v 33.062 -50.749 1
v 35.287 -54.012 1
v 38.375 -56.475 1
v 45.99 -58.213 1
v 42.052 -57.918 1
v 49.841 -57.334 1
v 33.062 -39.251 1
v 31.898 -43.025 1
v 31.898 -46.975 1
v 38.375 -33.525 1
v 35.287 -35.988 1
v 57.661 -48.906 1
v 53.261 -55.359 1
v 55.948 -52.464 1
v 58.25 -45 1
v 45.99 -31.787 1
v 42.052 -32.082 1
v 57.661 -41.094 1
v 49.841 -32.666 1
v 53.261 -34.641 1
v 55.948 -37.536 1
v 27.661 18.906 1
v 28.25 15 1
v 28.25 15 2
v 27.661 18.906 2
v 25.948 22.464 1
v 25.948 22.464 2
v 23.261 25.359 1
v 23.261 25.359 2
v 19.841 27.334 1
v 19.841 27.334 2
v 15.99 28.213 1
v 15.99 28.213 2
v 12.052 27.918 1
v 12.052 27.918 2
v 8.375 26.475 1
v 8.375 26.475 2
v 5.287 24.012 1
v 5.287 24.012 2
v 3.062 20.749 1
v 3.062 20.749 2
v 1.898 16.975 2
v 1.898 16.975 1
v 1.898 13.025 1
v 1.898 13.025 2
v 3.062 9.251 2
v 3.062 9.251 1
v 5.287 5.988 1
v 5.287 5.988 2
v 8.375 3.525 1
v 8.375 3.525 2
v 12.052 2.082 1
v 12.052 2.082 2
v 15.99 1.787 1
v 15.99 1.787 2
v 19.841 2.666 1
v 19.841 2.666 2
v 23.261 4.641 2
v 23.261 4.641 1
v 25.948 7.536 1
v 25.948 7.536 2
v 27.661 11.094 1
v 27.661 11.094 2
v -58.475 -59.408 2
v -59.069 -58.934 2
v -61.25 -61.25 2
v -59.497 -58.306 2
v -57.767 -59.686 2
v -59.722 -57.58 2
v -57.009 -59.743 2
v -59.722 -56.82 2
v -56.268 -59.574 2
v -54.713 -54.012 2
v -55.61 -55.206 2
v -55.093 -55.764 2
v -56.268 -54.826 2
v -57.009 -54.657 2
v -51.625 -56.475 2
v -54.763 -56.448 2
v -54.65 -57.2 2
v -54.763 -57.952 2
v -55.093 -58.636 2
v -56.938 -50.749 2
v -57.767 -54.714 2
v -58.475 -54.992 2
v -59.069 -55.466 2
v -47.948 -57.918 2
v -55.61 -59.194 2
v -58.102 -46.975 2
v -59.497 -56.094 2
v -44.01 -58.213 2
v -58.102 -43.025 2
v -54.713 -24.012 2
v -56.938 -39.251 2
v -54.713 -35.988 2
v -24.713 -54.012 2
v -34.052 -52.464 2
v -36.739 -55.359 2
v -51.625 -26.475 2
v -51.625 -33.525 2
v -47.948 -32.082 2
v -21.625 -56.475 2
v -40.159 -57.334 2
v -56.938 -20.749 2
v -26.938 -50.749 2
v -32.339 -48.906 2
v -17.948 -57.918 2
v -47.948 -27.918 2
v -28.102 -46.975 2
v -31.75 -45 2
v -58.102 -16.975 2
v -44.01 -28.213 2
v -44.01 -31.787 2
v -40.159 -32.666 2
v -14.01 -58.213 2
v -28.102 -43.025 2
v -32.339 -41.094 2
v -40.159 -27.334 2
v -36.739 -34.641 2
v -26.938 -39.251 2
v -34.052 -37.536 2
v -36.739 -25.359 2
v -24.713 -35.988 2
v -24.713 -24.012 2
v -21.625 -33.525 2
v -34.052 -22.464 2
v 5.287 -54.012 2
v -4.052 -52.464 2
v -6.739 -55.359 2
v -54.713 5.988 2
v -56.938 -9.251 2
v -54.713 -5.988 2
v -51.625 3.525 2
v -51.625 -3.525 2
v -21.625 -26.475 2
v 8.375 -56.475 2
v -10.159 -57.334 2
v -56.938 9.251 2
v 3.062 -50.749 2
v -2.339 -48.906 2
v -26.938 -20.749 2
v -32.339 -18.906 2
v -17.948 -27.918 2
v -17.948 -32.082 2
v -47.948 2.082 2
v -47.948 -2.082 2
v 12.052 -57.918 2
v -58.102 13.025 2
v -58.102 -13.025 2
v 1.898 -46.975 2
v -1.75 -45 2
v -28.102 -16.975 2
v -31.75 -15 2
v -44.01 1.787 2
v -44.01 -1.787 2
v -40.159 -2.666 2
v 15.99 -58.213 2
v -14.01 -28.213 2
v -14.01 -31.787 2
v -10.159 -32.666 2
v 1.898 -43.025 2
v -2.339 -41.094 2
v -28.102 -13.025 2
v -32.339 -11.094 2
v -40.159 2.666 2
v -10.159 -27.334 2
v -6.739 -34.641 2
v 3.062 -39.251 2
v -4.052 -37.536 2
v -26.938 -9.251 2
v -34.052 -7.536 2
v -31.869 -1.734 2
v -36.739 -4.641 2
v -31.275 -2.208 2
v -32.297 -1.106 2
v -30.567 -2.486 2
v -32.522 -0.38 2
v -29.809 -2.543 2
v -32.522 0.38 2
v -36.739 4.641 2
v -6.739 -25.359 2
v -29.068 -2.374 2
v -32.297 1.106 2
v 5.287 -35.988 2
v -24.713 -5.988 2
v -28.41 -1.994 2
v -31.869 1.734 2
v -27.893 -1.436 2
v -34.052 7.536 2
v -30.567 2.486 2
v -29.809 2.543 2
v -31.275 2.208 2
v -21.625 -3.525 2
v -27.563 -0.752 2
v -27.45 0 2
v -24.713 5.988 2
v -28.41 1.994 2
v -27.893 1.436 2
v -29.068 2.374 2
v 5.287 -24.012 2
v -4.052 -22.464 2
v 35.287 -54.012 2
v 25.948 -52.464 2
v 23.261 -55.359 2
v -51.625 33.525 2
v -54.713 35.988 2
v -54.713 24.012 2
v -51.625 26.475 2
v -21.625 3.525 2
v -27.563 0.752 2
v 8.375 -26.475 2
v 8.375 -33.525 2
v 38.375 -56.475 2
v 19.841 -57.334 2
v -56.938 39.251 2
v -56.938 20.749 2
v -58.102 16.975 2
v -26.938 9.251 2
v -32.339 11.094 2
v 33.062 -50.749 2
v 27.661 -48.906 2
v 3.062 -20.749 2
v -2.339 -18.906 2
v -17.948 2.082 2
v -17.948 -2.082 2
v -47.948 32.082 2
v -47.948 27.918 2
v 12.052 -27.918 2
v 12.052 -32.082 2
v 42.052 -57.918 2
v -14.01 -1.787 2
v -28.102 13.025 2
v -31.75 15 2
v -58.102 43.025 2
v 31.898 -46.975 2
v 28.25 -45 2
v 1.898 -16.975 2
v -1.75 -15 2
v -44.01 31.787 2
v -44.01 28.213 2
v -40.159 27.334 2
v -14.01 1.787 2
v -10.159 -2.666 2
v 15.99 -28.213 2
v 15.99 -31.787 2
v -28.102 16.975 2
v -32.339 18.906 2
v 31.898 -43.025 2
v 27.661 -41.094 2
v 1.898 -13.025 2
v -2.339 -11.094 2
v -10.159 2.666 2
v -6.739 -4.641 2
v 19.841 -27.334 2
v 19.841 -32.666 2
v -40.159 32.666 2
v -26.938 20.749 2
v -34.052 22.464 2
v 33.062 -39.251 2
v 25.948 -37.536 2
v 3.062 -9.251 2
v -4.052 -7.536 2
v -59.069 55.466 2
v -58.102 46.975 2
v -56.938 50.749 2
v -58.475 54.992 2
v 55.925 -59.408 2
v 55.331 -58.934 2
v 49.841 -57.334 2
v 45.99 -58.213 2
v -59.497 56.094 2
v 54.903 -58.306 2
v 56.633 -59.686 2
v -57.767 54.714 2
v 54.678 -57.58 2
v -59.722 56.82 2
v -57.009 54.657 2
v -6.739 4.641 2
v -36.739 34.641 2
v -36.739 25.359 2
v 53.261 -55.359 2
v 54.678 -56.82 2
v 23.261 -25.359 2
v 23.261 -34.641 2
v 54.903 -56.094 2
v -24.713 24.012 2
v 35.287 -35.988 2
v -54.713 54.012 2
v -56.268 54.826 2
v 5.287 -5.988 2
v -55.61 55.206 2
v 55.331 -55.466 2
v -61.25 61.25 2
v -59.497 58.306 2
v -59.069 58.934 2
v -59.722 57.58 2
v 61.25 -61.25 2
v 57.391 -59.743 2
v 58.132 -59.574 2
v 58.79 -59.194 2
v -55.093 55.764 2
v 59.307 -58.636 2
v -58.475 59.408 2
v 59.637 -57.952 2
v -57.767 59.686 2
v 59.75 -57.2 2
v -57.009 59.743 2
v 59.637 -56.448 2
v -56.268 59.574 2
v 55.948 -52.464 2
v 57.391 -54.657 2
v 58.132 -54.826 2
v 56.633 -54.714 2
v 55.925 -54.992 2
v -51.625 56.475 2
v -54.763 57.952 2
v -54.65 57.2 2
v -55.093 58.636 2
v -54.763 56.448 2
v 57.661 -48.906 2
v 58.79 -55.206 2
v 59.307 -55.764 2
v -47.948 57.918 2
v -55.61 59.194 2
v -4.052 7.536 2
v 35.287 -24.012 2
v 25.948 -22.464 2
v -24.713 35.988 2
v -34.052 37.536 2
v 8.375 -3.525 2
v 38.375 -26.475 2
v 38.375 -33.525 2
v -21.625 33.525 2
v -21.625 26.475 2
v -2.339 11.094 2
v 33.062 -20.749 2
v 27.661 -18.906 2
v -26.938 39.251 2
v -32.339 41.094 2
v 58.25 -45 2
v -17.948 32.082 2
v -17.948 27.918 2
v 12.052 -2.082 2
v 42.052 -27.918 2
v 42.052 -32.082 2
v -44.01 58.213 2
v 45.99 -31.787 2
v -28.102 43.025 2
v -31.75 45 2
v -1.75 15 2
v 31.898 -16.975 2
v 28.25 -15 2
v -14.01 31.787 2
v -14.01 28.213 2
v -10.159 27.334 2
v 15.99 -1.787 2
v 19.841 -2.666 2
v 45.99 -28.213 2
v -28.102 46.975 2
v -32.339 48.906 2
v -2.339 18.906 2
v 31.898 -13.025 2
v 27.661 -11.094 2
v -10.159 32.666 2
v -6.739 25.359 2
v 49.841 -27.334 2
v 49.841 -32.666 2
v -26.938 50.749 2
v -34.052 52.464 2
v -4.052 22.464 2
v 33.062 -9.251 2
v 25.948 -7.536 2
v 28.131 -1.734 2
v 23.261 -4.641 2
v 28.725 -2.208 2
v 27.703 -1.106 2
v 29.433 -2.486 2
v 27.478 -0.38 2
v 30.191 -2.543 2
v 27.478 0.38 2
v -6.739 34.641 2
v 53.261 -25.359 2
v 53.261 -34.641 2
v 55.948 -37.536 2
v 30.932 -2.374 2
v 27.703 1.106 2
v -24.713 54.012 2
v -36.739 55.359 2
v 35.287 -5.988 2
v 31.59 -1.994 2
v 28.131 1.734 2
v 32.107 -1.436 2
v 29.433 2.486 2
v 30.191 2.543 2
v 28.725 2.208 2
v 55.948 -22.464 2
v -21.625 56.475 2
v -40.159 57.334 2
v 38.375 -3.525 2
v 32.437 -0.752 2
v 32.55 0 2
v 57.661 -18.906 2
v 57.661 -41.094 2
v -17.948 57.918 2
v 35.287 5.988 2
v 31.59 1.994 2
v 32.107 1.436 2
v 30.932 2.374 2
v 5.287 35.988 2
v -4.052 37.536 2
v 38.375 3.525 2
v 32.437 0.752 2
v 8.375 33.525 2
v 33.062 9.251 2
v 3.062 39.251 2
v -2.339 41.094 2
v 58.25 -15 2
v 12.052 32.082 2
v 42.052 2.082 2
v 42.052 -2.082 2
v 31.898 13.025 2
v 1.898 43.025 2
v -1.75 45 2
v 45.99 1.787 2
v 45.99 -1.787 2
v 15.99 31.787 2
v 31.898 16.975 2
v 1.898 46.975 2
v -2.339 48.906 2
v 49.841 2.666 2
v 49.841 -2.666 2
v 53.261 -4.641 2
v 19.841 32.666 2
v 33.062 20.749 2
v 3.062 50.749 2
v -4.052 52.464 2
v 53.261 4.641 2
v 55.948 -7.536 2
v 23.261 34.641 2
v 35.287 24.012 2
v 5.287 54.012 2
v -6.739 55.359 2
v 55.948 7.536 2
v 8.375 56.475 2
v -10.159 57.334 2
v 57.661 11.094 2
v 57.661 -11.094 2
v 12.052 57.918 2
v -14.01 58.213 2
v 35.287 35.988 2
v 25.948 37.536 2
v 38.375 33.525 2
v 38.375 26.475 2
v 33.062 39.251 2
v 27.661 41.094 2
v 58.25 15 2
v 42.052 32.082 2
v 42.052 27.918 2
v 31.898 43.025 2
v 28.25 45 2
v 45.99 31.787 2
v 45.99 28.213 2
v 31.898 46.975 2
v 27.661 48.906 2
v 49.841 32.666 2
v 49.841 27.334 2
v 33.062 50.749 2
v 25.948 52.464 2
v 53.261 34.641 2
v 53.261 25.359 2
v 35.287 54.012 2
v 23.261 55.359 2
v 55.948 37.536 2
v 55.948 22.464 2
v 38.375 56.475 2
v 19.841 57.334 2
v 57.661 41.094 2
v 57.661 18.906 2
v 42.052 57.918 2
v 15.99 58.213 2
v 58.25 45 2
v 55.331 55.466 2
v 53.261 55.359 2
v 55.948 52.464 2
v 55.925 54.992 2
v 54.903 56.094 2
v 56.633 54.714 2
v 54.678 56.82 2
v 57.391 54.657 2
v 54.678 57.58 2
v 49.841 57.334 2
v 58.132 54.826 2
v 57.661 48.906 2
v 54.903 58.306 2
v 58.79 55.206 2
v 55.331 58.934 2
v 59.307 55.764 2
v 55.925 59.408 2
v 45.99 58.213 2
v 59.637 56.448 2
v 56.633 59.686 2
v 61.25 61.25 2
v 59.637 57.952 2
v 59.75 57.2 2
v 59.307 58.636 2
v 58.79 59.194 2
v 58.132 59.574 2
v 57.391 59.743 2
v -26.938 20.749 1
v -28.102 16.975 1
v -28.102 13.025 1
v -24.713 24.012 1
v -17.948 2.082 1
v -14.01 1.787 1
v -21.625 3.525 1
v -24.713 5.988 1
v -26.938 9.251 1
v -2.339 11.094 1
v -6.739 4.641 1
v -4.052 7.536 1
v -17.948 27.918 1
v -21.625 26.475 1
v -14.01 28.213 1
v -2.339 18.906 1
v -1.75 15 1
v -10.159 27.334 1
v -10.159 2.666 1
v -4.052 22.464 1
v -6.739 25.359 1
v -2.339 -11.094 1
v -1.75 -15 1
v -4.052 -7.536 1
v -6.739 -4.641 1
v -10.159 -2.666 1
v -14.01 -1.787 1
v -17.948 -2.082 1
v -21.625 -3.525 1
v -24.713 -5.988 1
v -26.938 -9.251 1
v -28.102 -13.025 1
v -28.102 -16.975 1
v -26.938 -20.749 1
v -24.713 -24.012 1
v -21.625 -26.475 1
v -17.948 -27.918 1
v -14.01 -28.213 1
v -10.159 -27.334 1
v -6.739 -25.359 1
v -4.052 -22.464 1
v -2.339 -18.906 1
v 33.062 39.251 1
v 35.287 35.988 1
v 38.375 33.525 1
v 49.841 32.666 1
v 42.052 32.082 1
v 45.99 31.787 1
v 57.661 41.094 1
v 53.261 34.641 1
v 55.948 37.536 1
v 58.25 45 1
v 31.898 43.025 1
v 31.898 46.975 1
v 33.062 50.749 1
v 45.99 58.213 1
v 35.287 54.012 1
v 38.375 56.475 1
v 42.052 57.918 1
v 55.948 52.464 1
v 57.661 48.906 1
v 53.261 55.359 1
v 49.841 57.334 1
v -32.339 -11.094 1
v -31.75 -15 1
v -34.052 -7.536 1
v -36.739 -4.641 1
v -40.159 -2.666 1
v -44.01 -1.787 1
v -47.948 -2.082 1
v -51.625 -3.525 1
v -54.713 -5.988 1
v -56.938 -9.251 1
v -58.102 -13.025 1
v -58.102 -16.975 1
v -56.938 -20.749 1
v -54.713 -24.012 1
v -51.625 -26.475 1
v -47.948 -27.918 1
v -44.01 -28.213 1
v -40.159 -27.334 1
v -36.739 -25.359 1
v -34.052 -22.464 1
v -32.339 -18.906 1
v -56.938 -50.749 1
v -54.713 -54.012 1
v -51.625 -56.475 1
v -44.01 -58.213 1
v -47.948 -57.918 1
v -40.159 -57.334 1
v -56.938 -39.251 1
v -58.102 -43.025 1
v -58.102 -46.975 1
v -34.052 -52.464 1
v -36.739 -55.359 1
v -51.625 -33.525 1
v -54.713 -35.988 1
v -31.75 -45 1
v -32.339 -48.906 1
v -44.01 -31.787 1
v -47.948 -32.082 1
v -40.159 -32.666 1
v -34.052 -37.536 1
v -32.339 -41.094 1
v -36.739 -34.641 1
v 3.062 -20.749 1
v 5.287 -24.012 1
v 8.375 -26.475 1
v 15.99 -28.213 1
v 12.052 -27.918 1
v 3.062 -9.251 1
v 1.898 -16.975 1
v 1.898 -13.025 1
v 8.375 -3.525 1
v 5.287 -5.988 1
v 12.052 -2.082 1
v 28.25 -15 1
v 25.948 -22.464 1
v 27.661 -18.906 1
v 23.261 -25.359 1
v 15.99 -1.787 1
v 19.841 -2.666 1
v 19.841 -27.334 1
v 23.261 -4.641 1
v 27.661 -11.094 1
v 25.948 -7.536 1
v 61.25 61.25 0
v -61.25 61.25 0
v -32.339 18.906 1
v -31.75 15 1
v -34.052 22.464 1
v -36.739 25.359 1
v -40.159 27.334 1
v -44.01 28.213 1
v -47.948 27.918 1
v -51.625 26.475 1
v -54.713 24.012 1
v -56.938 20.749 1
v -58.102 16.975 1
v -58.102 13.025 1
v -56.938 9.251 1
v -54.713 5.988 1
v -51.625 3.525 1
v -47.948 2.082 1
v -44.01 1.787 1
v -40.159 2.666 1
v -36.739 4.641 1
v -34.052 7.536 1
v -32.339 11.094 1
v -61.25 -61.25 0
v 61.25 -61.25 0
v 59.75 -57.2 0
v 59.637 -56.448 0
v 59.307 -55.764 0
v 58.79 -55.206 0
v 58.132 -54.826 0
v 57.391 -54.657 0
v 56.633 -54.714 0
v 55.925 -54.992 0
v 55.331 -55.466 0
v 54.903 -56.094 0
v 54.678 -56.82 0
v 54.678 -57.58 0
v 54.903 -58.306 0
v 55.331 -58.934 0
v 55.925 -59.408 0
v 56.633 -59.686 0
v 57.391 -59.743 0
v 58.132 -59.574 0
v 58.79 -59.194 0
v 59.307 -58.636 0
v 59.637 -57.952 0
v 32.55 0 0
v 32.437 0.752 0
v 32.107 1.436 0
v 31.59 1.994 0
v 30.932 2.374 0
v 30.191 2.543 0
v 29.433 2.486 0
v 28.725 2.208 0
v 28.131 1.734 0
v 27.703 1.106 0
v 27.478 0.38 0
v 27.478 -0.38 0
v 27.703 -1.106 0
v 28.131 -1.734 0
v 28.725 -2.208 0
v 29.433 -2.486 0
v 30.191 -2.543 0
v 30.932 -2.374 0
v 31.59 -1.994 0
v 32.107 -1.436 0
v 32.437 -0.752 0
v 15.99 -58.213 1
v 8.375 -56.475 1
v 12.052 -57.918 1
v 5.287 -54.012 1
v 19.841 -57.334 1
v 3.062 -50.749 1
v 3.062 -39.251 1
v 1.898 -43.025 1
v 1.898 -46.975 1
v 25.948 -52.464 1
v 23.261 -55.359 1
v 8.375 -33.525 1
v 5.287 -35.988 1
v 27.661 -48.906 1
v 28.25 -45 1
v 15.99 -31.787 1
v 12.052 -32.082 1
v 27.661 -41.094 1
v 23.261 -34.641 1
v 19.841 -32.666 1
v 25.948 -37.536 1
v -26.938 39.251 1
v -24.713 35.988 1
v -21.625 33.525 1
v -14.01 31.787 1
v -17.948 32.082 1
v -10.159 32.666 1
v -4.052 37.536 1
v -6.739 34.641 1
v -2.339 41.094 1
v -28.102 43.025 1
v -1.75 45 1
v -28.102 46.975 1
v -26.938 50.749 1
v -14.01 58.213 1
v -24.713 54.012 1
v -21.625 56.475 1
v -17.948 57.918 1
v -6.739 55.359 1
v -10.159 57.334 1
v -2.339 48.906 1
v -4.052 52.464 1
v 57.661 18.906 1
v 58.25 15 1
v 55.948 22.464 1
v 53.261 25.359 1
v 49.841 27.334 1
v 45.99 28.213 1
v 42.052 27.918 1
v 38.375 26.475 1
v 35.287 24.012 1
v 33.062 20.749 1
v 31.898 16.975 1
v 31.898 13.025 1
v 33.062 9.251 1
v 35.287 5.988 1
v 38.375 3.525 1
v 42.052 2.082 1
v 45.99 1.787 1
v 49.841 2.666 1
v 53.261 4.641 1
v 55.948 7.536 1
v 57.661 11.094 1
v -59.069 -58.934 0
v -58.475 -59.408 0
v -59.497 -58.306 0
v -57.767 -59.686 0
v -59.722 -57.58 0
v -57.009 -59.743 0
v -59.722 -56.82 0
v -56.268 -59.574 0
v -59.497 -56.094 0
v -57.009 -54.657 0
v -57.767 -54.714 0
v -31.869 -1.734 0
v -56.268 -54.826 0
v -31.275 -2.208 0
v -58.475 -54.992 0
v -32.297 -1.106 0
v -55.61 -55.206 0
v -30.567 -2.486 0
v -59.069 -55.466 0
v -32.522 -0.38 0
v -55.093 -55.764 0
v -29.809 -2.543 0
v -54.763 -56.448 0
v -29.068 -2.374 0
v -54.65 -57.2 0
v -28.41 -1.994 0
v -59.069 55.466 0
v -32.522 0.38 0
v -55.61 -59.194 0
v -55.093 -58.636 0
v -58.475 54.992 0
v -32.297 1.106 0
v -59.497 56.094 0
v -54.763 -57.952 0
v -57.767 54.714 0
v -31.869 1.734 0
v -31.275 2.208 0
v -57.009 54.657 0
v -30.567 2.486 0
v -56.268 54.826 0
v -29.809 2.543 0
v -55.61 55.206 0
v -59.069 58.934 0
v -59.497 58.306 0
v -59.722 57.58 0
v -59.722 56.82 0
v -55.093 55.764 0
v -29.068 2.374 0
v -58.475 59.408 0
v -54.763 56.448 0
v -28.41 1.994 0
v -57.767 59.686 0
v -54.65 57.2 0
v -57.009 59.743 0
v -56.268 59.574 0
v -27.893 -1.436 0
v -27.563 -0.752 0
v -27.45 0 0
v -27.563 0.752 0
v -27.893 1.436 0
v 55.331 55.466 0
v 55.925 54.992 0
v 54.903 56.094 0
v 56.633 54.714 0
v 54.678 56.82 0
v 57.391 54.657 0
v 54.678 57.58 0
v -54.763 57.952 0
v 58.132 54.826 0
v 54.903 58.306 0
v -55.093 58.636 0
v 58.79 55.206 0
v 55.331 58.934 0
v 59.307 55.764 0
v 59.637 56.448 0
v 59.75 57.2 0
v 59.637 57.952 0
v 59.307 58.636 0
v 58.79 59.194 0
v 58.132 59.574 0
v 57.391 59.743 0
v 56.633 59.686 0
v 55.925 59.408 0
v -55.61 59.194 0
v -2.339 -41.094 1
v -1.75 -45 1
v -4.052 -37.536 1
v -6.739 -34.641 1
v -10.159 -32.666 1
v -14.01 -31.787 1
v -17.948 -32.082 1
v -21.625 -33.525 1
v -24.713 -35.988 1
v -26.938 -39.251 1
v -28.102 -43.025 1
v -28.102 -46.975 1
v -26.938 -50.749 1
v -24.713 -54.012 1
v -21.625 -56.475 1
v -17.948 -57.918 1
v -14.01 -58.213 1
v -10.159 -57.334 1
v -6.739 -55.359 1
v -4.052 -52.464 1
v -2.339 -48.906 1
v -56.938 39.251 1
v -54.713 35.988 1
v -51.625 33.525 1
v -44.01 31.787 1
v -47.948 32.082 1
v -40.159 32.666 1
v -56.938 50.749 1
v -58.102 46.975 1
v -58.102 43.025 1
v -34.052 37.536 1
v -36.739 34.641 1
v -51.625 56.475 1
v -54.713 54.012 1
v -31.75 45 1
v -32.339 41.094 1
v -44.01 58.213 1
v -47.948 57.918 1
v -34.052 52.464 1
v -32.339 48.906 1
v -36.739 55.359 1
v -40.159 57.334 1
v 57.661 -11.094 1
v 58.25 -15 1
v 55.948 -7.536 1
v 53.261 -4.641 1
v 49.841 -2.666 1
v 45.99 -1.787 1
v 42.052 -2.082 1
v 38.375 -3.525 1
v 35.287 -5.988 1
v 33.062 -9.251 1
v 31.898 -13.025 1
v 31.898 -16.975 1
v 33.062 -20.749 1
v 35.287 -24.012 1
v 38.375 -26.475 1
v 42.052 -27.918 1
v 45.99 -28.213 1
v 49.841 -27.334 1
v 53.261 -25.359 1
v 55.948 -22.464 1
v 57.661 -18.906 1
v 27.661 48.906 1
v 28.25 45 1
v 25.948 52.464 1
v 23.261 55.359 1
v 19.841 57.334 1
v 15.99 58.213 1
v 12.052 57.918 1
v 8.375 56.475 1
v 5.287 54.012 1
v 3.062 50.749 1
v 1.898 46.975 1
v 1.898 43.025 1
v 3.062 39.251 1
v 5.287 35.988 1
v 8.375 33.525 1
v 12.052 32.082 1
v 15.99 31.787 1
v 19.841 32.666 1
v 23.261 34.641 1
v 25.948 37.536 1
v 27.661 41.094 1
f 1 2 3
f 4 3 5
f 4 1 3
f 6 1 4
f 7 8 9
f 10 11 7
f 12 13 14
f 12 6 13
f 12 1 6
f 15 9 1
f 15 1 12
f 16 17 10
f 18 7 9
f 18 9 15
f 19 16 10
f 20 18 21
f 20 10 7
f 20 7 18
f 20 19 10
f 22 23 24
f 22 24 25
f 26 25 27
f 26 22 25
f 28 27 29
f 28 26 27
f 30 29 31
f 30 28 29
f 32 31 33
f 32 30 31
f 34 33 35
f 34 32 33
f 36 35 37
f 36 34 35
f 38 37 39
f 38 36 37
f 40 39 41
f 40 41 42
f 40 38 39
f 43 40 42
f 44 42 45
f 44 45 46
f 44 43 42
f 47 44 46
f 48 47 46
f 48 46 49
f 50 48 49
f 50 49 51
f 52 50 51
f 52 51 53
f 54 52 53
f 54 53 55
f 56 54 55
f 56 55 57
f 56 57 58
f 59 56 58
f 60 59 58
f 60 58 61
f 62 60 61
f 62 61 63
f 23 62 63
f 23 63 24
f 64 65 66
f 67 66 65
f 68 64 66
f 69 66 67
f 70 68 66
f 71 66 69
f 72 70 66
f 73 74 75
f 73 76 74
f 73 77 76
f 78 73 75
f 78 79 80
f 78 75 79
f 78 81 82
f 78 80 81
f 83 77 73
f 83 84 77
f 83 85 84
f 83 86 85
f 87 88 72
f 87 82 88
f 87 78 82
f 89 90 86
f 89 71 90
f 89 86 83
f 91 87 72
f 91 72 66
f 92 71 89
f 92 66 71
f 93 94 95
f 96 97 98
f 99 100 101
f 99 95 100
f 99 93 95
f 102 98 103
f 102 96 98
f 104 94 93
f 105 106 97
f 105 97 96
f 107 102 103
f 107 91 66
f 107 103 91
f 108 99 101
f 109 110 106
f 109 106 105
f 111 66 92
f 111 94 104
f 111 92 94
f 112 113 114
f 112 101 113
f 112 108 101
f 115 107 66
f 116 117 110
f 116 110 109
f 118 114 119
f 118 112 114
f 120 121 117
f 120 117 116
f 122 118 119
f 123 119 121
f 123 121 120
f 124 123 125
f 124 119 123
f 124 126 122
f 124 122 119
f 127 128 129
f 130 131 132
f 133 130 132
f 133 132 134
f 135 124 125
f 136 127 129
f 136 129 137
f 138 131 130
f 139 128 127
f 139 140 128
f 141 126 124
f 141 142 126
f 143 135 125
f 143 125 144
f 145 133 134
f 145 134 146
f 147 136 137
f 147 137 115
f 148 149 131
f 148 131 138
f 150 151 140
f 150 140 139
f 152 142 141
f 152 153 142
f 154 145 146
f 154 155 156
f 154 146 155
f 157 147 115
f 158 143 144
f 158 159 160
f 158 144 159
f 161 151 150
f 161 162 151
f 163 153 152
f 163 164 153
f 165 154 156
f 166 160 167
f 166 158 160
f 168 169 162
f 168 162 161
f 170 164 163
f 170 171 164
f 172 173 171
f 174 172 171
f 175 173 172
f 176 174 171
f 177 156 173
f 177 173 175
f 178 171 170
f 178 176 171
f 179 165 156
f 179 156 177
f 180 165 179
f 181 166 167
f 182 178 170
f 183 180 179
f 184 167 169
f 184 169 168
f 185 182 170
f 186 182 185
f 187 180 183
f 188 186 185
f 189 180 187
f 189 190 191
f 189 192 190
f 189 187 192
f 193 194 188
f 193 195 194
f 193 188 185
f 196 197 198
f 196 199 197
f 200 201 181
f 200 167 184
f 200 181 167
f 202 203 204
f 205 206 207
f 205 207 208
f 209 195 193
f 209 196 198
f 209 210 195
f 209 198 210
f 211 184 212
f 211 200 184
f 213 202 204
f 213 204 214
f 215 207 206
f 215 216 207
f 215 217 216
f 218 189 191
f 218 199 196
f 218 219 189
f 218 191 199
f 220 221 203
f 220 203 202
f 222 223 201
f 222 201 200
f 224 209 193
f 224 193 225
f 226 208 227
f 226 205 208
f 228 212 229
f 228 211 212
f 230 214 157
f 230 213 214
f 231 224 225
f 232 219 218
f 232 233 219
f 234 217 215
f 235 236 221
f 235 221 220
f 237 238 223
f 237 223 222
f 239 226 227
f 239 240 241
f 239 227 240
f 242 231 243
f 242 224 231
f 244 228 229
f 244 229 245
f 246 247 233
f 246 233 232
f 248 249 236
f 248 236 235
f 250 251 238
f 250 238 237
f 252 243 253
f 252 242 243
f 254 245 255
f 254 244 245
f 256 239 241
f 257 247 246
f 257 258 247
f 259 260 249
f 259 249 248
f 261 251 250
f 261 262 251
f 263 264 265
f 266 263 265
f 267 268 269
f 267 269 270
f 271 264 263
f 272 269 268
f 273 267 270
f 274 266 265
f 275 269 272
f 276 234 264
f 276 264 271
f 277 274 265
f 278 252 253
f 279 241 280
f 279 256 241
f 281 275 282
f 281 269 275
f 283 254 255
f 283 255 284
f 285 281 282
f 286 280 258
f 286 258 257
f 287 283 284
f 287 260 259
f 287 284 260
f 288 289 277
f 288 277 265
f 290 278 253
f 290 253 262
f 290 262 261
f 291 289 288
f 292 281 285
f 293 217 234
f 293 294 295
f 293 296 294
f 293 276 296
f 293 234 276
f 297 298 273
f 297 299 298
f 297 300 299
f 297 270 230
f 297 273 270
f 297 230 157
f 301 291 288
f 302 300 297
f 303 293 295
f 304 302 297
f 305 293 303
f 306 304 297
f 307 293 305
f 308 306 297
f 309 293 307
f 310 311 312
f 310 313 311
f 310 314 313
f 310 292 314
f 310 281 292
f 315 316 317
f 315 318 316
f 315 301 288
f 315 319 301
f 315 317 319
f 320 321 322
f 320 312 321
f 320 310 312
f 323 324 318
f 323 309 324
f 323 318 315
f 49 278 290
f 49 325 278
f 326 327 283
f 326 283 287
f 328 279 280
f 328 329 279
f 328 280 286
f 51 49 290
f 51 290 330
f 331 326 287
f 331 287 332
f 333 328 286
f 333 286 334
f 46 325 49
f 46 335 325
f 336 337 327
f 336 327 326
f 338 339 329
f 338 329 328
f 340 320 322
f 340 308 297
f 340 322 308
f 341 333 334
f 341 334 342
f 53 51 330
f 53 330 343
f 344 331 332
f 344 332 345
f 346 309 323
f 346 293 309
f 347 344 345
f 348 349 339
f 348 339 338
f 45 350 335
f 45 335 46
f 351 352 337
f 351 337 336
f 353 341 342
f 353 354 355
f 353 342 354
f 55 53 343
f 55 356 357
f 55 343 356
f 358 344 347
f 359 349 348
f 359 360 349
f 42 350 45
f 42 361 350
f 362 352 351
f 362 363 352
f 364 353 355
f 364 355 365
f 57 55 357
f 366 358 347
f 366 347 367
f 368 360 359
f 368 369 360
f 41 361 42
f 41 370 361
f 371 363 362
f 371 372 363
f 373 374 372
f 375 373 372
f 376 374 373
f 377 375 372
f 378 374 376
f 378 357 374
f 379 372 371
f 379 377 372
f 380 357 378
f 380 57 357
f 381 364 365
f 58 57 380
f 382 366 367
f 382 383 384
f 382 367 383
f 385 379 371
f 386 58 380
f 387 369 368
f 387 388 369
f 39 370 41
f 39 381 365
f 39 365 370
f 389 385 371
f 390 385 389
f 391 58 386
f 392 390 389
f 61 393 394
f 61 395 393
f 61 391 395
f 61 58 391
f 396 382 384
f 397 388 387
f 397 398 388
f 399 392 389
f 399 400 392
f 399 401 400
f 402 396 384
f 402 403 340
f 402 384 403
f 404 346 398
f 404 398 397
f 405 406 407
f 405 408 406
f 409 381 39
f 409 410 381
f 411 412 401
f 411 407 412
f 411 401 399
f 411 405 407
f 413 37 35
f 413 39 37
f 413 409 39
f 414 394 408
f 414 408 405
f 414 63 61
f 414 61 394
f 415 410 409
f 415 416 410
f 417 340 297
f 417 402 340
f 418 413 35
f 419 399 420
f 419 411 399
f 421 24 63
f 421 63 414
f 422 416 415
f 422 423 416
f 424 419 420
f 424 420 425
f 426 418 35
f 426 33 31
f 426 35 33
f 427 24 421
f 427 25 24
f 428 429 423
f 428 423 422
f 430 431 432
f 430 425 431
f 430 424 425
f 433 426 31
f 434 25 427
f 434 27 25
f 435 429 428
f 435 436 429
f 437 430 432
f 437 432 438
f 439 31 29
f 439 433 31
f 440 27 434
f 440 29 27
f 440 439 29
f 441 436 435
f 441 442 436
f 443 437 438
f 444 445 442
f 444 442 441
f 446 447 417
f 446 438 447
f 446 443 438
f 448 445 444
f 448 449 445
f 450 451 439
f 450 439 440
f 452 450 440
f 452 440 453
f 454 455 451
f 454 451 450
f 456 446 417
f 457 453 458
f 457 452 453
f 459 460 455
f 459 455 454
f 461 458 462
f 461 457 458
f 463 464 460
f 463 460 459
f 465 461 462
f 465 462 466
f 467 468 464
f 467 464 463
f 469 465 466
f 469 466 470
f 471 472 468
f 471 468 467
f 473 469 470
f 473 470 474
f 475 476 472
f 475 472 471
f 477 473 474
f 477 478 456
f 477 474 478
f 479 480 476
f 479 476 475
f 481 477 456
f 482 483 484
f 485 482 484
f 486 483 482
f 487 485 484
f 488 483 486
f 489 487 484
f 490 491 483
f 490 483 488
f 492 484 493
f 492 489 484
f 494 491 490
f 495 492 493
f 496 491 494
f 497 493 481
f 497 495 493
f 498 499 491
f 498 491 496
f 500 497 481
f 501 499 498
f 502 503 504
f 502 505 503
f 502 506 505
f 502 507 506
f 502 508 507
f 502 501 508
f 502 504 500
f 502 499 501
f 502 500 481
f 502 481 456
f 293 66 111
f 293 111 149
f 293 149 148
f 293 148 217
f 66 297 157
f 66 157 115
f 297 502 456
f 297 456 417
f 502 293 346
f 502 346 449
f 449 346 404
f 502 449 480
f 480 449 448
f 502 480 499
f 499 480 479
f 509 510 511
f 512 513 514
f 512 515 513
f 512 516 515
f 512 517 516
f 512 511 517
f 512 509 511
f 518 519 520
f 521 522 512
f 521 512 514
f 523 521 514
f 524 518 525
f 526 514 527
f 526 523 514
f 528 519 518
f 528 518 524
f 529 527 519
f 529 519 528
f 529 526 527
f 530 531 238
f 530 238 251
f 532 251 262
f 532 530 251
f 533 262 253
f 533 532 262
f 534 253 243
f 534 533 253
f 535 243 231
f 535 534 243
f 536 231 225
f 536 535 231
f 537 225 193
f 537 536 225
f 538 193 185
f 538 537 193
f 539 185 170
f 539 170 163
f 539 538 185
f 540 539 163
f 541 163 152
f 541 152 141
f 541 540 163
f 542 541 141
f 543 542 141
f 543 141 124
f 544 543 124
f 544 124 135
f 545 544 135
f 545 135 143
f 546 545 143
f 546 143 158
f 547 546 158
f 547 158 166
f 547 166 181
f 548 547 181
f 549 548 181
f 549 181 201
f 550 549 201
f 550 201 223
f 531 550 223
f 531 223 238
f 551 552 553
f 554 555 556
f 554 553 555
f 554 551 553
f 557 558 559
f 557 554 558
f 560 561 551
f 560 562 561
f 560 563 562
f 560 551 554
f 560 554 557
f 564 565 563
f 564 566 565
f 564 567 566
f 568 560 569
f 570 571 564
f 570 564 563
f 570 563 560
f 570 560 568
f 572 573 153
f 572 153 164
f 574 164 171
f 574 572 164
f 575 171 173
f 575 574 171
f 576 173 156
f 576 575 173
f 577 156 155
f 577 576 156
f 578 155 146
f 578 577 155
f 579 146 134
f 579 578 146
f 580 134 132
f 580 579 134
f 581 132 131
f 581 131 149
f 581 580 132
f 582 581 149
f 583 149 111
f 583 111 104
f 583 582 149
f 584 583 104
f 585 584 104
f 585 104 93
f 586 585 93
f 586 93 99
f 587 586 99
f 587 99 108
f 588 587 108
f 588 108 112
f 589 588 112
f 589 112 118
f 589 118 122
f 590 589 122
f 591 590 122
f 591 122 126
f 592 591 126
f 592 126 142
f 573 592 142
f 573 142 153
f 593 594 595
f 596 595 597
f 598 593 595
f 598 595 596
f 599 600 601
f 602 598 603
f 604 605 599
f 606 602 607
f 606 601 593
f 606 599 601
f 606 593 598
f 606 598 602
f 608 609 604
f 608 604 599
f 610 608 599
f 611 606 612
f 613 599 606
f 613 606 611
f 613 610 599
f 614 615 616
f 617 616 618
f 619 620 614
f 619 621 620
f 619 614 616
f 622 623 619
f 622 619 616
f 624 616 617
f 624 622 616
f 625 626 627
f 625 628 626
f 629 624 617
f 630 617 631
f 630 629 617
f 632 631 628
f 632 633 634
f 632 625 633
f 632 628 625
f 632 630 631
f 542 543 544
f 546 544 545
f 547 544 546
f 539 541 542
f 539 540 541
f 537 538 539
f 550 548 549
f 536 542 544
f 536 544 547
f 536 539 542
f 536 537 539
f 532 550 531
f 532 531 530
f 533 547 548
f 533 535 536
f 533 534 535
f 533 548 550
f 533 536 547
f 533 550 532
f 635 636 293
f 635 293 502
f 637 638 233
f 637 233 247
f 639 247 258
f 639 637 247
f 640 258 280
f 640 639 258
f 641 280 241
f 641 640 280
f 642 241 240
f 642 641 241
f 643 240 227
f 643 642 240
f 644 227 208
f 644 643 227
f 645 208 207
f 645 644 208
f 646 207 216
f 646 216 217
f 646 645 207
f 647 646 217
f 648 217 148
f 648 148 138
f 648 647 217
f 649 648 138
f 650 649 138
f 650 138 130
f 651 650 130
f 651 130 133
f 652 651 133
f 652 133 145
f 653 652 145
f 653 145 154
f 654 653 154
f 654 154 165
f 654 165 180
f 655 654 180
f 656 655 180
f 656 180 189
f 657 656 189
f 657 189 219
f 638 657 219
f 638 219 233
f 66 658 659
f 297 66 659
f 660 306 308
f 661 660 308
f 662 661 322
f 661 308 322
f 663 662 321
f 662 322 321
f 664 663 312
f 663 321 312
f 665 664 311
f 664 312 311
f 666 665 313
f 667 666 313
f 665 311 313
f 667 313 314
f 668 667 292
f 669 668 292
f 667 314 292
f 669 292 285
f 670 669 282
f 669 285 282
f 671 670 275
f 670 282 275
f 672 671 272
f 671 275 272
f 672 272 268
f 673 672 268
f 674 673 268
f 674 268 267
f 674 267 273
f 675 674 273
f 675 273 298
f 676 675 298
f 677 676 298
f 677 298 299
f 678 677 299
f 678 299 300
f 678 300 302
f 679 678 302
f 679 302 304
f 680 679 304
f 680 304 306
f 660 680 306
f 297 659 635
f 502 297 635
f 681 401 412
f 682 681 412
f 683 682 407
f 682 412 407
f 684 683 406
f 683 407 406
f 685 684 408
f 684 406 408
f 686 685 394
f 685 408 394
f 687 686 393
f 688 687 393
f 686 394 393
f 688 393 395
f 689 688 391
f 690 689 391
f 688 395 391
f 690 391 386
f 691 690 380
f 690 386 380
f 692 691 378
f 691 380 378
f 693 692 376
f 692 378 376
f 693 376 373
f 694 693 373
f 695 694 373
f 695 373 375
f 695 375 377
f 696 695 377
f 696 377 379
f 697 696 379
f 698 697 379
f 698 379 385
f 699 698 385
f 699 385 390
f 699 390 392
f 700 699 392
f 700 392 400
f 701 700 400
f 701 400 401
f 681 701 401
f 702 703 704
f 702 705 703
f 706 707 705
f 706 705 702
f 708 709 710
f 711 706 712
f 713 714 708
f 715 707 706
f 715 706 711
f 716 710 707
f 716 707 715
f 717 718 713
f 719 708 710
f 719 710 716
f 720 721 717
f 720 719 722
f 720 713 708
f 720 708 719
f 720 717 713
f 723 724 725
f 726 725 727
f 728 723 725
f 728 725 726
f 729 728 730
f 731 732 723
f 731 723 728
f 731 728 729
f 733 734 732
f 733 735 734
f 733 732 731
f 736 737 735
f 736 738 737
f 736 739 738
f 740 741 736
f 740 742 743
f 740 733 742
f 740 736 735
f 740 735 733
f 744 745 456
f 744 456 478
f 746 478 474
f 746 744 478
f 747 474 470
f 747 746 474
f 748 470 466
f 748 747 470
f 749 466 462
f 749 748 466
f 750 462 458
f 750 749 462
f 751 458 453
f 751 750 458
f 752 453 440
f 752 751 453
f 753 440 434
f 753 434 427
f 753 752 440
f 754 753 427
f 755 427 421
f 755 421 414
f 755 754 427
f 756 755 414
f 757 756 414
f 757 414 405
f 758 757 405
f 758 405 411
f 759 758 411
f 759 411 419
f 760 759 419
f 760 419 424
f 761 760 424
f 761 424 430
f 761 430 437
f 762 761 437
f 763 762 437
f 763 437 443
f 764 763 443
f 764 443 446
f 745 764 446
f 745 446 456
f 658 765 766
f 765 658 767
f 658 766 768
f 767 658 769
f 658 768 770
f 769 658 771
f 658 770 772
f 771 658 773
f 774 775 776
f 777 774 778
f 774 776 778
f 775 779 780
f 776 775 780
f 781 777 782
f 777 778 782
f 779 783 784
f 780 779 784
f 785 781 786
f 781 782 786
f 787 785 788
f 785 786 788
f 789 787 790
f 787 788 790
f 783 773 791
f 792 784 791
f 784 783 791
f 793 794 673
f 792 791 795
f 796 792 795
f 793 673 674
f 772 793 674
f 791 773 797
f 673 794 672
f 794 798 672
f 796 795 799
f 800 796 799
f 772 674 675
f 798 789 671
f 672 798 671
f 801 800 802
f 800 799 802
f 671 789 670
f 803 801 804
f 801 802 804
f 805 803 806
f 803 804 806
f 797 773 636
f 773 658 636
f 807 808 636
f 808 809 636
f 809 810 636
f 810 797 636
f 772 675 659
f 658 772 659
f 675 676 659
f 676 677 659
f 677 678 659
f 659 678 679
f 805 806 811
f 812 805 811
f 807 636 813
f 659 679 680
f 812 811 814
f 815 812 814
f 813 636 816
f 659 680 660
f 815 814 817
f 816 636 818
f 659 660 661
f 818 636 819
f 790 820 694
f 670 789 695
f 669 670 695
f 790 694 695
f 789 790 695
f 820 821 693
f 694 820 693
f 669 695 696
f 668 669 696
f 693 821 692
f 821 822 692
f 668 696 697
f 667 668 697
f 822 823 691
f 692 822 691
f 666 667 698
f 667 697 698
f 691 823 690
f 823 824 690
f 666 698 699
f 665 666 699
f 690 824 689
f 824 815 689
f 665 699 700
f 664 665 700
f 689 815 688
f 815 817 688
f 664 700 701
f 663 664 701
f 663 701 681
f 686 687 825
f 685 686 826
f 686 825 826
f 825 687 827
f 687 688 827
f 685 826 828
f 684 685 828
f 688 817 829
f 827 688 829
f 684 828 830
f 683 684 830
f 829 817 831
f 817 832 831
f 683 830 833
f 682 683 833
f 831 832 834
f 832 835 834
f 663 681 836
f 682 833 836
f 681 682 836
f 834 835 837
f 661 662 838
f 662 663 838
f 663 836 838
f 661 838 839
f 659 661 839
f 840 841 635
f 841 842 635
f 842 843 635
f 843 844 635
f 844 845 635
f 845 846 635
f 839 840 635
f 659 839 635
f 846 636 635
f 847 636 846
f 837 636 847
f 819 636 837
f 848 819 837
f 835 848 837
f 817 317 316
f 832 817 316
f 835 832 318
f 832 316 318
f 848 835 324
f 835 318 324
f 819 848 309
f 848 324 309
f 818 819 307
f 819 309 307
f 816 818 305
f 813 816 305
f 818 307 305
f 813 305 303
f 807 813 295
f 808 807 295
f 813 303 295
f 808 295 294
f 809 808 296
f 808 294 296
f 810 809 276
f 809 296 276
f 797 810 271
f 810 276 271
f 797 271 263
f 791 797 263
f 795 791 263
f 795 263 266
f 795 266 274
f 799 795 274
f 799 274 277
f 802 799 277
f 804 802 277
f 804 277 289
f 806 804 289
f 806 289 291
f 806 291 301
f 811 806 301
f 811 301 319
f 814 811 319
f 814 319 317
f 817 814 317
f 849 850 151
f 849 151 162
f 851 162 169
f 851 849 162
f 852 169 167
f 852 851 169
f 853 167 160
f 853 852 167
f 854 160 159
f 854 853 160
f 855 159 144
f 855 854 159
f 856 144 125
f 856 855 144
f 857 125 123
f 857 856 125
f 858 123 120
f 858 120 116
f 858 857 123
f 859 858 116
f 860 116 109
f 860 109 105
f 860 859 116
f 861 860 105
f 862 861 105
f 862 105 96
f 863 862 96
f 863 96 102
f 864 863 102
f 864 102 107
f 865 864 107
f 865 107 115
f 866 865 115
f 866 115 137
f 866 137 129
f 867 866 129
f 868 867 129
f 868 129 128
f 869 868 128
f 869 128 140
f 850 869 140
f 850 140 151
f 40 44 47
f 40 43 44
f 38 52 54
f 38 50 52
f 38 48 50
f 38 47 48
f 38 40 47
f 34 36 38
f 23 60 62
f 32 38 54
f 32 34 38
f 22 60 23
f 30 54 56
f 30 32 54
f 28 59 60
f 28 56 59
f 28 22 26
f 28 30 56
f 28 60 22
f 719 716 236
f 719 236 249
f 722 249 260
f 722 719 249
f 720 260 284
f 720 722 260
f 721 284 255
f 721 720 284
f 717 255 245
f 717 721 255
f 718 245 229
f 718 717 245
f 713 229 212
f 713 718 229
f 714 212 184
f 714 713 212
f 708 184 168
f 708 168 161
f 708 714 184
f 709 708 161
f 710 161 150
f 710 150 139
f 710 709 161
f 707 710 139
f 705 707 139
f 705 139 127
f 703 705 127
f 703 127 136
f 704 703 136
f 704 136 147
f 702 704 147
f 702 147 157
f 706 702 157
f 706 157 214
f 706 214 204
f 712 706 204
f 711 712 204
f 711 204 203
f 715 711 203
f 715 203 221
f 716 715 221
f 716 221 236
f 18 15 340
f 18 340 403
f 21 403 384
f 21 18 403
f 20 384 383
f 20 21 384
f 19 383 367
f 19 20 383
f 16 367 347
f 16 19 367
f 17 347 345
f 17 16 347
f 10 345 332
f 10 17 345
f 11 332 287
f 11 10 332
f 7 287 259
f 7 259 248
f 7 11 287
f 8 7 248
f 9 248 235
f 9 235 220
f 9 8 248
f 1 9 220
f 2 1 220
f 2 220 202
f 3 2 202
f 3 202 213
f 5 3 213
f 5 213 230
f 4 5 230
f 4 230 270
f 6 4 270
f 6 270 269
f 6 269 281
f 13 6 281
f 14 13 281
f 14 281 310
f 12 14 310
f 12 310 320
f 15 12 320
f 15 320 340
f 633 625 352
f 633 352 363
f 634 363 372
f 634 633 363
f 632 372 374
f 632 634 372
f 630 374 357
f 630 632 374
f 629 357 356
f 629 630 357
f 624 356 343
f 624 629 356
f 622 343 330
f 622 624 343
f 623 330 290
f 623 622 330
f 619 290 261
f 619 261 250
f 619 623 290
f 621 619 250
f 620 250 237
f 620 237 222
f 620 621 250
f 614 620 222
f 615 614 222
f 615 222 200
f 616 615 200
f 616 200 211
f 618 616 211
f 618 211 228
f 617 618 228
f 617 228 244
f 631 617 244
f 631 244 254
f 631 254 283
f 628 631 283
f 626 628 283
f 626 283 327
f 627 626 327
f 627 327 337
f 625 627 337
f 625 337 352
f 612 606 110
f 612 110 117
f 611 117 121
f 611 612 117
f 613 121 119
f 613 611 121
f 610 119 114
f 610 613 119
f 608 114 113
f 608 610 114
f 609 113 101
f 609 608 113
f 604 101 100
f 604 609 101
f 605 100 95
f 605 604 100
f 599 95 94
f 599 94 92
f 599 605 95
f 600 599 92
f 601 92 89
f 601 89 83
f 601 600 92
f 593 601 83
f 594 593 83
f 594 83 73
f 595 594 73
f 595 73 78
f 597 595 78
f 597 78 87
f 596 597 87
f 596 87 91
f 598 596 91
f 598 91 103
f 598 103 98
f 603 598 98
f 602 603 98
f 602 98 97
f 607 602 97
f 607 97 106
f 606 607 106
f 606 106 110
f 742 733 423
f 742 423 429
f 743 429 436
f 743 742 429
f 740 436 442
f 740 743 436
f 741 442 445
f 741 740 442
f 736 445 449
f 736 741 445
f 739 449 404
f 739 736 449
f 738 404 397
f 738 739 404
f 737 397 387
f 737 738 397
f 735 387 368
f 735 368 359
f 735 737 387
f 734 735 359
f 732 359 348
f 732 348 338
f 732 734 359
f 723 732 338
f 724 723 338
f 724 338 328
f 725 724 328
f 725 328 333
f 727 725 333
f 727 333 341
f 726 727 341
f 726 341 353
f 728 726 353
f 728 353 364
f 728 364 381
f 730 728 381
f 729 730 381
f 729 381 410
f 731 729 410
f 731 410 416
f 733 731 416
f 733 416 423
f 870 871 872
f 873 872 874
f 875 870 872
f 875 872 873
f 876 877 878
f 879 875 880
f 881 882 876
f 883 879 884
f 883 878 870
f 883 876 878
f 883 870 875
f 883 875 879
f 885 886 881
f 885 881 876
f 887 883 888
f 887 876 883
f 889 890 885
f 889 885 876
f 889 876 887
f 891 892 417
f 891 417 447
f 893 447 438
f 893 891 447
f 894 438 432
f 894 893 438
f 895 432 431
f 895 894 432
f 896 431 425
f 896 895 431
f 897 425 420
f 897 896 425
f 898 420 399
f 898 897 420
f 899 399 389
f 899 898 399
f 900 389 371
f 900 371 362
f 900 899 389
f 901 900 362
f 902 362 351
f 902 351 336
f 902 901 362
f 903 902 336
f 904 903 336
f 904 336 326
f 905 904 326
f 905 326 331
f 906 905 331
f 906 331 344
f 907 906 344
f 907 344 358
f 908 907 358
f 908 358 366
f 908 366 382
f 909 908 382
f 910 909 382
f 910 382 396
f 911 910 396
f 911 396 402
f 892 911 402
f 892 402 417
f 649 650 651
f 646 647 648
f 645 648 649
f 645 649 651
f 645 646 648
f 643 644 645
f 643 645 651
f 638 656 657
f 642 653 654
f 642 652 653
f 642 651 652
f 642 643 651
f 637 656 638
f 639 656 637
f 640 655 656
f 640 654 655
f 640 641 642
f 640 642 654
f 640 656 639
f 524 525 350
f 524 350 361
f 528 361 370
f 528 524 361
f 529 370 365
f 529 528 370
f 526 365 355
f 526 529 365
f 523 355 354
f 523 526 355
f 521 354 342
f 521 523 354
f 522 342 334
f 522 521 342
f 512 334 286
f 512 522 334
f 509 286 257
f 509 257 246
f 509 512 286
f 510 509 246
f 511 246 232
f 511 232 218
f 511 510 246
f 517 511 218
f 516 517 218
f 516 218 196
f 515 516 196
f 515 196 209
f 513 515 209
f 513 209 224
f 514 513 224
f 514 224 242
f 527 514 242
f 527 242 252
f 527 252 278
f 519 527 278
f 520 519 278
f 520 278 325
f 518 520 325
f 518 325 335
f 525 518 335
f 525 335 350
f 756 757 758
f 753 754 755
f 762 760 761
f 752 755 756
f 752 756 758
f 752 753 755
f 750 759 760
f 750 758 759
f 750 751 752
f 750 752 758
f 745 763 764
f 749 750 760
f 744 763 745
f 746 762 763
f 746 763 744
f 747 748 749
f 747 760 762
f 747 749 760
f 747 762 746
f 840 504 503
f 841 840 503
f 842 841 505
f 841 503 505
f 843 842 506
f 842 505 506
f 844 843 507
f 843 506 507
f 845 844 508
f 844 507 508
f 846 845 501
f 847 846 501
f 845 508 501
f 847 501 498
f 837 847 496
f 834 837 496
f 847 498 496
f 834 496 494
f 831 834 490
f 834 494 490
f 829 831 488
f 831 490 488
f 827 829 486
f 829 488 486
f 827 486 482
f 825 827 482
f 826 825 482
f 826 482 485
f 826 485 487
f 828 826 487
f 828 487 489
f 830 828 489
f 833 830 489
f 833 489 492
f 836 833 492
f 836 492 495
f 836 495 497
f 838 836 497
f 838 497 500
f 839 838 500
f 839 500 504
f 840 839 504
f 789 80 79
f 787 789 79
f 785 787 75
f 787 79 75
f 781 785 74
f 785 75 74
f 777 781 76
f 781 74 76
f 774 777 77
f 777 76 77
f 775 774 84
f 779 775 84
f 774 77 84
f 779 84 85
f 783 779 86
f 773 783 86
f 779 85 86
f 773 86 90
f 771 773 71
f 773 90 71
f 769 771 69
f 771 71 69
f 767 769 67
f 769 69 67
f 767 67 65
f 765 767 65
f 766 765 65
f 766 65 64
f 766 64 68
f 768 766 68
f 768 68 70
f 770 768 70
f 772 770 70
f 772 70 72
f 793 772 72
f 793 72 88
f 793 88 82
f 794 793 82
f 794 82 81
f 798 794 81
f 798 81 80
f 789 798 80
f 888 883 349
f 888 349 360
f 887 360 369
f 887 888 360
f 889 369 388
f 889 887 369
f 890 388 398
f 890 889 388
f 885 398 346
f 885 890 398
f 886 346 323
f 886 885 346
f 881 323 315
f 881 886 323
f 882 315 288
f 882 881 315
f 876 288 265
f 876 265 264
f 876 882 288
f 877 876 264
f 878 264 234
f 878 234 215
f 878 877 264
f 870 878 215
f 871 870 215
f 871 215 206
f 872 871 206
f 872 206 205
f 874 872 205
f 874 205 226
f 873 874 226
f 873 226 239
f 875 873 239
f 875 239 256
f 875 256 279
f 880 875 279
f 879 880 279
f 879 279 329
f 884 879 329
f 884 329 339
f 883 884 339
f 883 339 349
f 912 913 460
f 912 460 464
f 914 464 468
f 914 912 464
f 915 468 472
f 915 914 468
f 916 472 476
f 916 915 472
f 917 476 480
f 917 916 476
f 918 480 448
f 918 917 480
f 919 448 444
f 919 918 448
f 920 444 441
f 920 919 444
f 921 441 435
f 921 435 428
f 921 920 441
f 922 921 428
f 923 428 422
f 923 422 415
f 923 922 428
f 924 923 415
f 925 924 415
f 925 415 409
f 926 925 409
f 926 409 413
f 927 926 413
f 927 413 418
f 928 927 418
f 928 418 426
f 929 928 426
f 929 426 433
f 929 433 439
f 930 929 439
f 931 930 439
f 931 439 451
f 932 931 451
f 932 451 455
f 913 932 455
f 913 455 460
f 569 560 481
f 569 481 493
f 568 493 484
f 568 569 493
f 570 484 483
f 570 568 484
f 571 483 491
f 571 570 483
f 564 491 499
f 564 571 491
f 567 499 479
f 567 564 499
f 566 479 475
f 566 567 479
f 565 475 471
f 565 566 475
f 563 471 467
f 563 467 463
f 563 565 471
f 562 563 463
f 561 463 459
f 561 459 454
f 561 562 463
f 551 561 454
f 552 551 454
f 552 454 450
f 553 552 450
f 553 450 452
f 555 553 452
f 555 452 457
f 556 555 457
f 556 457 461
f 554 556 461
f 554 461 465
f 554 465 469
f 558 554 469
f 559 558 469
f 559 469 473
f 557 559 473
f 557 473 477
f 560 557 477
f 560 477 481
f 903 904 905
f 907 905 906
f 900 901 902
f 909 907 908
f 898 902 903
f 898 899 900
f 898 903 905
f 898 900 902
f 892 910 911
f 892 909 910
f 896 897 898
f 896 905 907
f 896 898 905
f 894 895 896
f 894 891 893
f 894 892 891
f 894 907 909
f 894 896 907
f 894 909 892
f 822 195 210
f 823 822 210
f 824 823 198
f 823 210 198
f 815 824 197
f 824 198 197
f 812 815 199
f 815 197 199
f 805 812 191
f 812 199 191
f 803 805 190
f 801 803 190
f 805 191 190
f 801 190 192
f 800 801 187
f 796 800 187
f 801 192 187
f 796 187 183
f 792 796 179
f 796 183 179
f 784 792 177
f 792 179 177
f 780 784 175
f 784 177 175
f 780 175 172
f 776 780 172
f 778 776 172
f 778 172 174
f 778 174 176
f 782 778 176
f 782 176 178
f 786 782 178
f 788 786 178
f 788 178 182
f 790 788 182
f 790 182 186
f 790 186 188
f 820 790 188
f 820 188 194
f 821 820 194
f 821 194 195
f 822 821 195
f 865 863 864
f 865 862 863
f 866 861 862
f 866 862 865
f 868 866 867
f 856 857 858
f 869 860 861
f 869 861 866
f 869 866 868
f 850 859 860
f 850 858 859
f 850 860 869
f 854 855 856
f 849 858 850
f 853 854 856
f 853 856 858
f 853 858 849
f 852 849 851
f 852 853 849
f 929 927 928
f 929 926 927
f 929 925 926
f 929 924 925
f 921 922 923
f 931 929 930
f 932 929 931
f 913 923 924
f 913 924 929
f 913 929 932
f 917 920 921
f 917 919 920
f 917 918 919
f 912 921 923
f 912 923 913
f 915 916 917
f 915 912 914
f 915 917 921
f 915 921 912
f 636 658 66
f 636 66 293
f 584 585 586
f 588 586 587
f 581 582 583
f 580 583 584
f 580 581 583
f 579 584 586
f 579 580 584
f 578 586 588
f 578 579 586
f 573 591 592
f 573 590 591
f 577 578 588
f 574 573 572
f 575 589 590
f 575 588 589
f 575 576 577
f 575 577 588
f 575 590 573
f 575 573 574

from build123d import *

# Parameters (mm, degrees)
F0_W     = 122.5
F0_H     = 122.5
F0_R     = 13.25
F1_DEPTH = 1
F2_DEPTH = 2
F3_R     = 2.55
F4_DEPTH = 2.001


# Not quite as in the source:
# - a feature names something its author has since deleted; it is built from what else it names


with BuildPart() as f1:
    # F0 (on Top) → F1 (new body)
    with BuildSketch(Plane.XY):
        Rectangle(F0_W, F0_H)
        with Locations((-45, -45)):
            Circle(F0_R, mode=Mode.SUBTRACT)
        with Locations((-15, -45)):
            Circle(F0_R, mode=Mode.SUBTRACT)
        with Locations((-45, -15)):
            Circle(F0_R, mode=Mode.SUBTRACT)
        with Locations((-15, -15)):
            Circle(F0_R, mode=Mode.SUBTRACT)
        with Locations((15, -45)):
            Circle(F0_R, mode=Mode.SUBTRACT)
        with Locations((45, -45)):
            Circle(F0_R, mode=Mode.SUBTRACT)
        with Locations((15, -15)):
            Circle(F0_R, mode=Mode.SUBTRACT)
        with Locations((45, -15)):
            Circle(F0_R, mode=Mode.SUBTRACT)
        with Locations((-45, 15)):
            Circle(F0_R, mode=Mode.SUBTRACT)
        with Locations((-15, 15)):
            Circle(F0_R, mode=Mode.SUBTRACT)
        with Locations((-45, 45)):
            Circle(F0_R, mode=Mode.SUBTRACT)
        with Locations((-15, 45)):
            Circle(F0_R, mode=Mode.SUBTRACT)
        with Locations((15, 15)):
            Circle(F0_R, mode=Mode.SUBTRACT)
        with Locations((45, 15)):
            Circle(F0_R, mode=Mode.SUBTRACT)
        with Locations((15, 45)):
            Circle(F0_R, mode=Mode.SUBTRACT)
        with Locations((45, 45)):
            Circle(F0_R, mode=Mode.SUBTRACT)
        with Locations((-45, 45)):
            Circle(F0_R)
        with Locations((-15, 45)):
            Circle(F0_R)
        with Locations((15, 45)):
            Circle(F0_R)
        with Locations((45, 45)):
            Circle(F0_R)
        with Locations((45, 15)):
            Circle(F0_R)
        with Locations((-15, 15)):
            Circle(F0_R)
        with Locations((-45, 15)):
            Circle(F0_R)
        with Locations((15, 15)):
            Circle(F0_R)
        with Locations((15, -15)):
            Circle(F0_R)
        with Locations((-15, -15)):
            Circle(F0_R)
        with Locations((-45, -15)):
            Circle(F0_R)
        with Locations((45, -15)):
            Circle(F0_R)
        with Locations((45, -45)):
            Circle(F0_R)
        with Locations((15, -45)):
            Circle(F0_R)
        with Locations((-15, -45)):
            Circle(F0_R)
        with Locations((-45, -45)):
            Circle(F0_R)
    extrude(amount=F1_DEPTH)

    # F0 (on Top) → F2 (join)
    with BuildSketch(Plane.XY):
        Rectangle(F0_W, F0_H)
        with Locations((-45, -45)):
            Circle(F0_R, mode=Mode.SUBTRACT)
        with Locations((-15, -45)):
            Circle(F0_R, mode=Mode.SUBTRACT)
        with Locations((-45, -15)):
            Circle(F0_R, mode=Mode.SUBTRACT)
        with Locations((-15, -15)):
            Circle(F0_R, mode=Mode.SUBTRACT)
        with Locations((15, -45)):
            Circle(F0_R, mode=Mode.SUBTRACT)
        with Locations((45, -45)):
            Circle(F0_R, mode=Mode.SUBTRACT)
        with Locations((15, -15)):
            Circle(F0_R, mode=Mode.SUBTRACT)
        with Locations((45, -15)):
            Circle(F0_R, mode=Mode.SUBTRACT)
        with Locations((-45, 15)):
            Circle(F0_R, mode=Mode.SUBTRACT)
        with Locations((-15, 15)):
            Circle(F0_R, mode=Mode.SUBTRACT)
        with Locations((-45, 45)):
            Circle(F0_R, mode=Mode.SUBTRACT)
        with Locations((-15, 45)):
            Circle(F0_R, mode=Mode.SUBTRACT)
        with Locations((15, 15)):
            Circle(F0_R, mode=Mode.SUBTRACT)
        with Locations((45, 15)):
            Circle(F0_R, mode=Mode.SUBTRACT)
        with Locations((15, 45)):
            Circle(F0_R, mode=Mode.SUBTRACT)
        with Locations((45, 45)):
            Circle(F0_R, mode=Mode.SUBTRACT)
    extrude(amount=F2_DEPTH)

    # F3 (on face) → F4 (cut, through all)
    with BuildSketch(Plane.XY.offset(2)):
        with Locations((-57.2, 57.2)):
            Circle(F3_R)
        with Locations((-30, 0)):
            Circle(F3_R)
        with Locations((57.2, 57.2)):
            Circle(F3_R)
        with Locations((30, 0)):
            Circle(F3_R)
        with Locations((57.2, -57.2)):
            Circle(F3_R)
        with Locations((-57.2, -57.2)):
            Circle(F3_R)
    extrude(amount=-F4_DEPTH, mode=Mode.SUBTRACT)


solid = f1.part
